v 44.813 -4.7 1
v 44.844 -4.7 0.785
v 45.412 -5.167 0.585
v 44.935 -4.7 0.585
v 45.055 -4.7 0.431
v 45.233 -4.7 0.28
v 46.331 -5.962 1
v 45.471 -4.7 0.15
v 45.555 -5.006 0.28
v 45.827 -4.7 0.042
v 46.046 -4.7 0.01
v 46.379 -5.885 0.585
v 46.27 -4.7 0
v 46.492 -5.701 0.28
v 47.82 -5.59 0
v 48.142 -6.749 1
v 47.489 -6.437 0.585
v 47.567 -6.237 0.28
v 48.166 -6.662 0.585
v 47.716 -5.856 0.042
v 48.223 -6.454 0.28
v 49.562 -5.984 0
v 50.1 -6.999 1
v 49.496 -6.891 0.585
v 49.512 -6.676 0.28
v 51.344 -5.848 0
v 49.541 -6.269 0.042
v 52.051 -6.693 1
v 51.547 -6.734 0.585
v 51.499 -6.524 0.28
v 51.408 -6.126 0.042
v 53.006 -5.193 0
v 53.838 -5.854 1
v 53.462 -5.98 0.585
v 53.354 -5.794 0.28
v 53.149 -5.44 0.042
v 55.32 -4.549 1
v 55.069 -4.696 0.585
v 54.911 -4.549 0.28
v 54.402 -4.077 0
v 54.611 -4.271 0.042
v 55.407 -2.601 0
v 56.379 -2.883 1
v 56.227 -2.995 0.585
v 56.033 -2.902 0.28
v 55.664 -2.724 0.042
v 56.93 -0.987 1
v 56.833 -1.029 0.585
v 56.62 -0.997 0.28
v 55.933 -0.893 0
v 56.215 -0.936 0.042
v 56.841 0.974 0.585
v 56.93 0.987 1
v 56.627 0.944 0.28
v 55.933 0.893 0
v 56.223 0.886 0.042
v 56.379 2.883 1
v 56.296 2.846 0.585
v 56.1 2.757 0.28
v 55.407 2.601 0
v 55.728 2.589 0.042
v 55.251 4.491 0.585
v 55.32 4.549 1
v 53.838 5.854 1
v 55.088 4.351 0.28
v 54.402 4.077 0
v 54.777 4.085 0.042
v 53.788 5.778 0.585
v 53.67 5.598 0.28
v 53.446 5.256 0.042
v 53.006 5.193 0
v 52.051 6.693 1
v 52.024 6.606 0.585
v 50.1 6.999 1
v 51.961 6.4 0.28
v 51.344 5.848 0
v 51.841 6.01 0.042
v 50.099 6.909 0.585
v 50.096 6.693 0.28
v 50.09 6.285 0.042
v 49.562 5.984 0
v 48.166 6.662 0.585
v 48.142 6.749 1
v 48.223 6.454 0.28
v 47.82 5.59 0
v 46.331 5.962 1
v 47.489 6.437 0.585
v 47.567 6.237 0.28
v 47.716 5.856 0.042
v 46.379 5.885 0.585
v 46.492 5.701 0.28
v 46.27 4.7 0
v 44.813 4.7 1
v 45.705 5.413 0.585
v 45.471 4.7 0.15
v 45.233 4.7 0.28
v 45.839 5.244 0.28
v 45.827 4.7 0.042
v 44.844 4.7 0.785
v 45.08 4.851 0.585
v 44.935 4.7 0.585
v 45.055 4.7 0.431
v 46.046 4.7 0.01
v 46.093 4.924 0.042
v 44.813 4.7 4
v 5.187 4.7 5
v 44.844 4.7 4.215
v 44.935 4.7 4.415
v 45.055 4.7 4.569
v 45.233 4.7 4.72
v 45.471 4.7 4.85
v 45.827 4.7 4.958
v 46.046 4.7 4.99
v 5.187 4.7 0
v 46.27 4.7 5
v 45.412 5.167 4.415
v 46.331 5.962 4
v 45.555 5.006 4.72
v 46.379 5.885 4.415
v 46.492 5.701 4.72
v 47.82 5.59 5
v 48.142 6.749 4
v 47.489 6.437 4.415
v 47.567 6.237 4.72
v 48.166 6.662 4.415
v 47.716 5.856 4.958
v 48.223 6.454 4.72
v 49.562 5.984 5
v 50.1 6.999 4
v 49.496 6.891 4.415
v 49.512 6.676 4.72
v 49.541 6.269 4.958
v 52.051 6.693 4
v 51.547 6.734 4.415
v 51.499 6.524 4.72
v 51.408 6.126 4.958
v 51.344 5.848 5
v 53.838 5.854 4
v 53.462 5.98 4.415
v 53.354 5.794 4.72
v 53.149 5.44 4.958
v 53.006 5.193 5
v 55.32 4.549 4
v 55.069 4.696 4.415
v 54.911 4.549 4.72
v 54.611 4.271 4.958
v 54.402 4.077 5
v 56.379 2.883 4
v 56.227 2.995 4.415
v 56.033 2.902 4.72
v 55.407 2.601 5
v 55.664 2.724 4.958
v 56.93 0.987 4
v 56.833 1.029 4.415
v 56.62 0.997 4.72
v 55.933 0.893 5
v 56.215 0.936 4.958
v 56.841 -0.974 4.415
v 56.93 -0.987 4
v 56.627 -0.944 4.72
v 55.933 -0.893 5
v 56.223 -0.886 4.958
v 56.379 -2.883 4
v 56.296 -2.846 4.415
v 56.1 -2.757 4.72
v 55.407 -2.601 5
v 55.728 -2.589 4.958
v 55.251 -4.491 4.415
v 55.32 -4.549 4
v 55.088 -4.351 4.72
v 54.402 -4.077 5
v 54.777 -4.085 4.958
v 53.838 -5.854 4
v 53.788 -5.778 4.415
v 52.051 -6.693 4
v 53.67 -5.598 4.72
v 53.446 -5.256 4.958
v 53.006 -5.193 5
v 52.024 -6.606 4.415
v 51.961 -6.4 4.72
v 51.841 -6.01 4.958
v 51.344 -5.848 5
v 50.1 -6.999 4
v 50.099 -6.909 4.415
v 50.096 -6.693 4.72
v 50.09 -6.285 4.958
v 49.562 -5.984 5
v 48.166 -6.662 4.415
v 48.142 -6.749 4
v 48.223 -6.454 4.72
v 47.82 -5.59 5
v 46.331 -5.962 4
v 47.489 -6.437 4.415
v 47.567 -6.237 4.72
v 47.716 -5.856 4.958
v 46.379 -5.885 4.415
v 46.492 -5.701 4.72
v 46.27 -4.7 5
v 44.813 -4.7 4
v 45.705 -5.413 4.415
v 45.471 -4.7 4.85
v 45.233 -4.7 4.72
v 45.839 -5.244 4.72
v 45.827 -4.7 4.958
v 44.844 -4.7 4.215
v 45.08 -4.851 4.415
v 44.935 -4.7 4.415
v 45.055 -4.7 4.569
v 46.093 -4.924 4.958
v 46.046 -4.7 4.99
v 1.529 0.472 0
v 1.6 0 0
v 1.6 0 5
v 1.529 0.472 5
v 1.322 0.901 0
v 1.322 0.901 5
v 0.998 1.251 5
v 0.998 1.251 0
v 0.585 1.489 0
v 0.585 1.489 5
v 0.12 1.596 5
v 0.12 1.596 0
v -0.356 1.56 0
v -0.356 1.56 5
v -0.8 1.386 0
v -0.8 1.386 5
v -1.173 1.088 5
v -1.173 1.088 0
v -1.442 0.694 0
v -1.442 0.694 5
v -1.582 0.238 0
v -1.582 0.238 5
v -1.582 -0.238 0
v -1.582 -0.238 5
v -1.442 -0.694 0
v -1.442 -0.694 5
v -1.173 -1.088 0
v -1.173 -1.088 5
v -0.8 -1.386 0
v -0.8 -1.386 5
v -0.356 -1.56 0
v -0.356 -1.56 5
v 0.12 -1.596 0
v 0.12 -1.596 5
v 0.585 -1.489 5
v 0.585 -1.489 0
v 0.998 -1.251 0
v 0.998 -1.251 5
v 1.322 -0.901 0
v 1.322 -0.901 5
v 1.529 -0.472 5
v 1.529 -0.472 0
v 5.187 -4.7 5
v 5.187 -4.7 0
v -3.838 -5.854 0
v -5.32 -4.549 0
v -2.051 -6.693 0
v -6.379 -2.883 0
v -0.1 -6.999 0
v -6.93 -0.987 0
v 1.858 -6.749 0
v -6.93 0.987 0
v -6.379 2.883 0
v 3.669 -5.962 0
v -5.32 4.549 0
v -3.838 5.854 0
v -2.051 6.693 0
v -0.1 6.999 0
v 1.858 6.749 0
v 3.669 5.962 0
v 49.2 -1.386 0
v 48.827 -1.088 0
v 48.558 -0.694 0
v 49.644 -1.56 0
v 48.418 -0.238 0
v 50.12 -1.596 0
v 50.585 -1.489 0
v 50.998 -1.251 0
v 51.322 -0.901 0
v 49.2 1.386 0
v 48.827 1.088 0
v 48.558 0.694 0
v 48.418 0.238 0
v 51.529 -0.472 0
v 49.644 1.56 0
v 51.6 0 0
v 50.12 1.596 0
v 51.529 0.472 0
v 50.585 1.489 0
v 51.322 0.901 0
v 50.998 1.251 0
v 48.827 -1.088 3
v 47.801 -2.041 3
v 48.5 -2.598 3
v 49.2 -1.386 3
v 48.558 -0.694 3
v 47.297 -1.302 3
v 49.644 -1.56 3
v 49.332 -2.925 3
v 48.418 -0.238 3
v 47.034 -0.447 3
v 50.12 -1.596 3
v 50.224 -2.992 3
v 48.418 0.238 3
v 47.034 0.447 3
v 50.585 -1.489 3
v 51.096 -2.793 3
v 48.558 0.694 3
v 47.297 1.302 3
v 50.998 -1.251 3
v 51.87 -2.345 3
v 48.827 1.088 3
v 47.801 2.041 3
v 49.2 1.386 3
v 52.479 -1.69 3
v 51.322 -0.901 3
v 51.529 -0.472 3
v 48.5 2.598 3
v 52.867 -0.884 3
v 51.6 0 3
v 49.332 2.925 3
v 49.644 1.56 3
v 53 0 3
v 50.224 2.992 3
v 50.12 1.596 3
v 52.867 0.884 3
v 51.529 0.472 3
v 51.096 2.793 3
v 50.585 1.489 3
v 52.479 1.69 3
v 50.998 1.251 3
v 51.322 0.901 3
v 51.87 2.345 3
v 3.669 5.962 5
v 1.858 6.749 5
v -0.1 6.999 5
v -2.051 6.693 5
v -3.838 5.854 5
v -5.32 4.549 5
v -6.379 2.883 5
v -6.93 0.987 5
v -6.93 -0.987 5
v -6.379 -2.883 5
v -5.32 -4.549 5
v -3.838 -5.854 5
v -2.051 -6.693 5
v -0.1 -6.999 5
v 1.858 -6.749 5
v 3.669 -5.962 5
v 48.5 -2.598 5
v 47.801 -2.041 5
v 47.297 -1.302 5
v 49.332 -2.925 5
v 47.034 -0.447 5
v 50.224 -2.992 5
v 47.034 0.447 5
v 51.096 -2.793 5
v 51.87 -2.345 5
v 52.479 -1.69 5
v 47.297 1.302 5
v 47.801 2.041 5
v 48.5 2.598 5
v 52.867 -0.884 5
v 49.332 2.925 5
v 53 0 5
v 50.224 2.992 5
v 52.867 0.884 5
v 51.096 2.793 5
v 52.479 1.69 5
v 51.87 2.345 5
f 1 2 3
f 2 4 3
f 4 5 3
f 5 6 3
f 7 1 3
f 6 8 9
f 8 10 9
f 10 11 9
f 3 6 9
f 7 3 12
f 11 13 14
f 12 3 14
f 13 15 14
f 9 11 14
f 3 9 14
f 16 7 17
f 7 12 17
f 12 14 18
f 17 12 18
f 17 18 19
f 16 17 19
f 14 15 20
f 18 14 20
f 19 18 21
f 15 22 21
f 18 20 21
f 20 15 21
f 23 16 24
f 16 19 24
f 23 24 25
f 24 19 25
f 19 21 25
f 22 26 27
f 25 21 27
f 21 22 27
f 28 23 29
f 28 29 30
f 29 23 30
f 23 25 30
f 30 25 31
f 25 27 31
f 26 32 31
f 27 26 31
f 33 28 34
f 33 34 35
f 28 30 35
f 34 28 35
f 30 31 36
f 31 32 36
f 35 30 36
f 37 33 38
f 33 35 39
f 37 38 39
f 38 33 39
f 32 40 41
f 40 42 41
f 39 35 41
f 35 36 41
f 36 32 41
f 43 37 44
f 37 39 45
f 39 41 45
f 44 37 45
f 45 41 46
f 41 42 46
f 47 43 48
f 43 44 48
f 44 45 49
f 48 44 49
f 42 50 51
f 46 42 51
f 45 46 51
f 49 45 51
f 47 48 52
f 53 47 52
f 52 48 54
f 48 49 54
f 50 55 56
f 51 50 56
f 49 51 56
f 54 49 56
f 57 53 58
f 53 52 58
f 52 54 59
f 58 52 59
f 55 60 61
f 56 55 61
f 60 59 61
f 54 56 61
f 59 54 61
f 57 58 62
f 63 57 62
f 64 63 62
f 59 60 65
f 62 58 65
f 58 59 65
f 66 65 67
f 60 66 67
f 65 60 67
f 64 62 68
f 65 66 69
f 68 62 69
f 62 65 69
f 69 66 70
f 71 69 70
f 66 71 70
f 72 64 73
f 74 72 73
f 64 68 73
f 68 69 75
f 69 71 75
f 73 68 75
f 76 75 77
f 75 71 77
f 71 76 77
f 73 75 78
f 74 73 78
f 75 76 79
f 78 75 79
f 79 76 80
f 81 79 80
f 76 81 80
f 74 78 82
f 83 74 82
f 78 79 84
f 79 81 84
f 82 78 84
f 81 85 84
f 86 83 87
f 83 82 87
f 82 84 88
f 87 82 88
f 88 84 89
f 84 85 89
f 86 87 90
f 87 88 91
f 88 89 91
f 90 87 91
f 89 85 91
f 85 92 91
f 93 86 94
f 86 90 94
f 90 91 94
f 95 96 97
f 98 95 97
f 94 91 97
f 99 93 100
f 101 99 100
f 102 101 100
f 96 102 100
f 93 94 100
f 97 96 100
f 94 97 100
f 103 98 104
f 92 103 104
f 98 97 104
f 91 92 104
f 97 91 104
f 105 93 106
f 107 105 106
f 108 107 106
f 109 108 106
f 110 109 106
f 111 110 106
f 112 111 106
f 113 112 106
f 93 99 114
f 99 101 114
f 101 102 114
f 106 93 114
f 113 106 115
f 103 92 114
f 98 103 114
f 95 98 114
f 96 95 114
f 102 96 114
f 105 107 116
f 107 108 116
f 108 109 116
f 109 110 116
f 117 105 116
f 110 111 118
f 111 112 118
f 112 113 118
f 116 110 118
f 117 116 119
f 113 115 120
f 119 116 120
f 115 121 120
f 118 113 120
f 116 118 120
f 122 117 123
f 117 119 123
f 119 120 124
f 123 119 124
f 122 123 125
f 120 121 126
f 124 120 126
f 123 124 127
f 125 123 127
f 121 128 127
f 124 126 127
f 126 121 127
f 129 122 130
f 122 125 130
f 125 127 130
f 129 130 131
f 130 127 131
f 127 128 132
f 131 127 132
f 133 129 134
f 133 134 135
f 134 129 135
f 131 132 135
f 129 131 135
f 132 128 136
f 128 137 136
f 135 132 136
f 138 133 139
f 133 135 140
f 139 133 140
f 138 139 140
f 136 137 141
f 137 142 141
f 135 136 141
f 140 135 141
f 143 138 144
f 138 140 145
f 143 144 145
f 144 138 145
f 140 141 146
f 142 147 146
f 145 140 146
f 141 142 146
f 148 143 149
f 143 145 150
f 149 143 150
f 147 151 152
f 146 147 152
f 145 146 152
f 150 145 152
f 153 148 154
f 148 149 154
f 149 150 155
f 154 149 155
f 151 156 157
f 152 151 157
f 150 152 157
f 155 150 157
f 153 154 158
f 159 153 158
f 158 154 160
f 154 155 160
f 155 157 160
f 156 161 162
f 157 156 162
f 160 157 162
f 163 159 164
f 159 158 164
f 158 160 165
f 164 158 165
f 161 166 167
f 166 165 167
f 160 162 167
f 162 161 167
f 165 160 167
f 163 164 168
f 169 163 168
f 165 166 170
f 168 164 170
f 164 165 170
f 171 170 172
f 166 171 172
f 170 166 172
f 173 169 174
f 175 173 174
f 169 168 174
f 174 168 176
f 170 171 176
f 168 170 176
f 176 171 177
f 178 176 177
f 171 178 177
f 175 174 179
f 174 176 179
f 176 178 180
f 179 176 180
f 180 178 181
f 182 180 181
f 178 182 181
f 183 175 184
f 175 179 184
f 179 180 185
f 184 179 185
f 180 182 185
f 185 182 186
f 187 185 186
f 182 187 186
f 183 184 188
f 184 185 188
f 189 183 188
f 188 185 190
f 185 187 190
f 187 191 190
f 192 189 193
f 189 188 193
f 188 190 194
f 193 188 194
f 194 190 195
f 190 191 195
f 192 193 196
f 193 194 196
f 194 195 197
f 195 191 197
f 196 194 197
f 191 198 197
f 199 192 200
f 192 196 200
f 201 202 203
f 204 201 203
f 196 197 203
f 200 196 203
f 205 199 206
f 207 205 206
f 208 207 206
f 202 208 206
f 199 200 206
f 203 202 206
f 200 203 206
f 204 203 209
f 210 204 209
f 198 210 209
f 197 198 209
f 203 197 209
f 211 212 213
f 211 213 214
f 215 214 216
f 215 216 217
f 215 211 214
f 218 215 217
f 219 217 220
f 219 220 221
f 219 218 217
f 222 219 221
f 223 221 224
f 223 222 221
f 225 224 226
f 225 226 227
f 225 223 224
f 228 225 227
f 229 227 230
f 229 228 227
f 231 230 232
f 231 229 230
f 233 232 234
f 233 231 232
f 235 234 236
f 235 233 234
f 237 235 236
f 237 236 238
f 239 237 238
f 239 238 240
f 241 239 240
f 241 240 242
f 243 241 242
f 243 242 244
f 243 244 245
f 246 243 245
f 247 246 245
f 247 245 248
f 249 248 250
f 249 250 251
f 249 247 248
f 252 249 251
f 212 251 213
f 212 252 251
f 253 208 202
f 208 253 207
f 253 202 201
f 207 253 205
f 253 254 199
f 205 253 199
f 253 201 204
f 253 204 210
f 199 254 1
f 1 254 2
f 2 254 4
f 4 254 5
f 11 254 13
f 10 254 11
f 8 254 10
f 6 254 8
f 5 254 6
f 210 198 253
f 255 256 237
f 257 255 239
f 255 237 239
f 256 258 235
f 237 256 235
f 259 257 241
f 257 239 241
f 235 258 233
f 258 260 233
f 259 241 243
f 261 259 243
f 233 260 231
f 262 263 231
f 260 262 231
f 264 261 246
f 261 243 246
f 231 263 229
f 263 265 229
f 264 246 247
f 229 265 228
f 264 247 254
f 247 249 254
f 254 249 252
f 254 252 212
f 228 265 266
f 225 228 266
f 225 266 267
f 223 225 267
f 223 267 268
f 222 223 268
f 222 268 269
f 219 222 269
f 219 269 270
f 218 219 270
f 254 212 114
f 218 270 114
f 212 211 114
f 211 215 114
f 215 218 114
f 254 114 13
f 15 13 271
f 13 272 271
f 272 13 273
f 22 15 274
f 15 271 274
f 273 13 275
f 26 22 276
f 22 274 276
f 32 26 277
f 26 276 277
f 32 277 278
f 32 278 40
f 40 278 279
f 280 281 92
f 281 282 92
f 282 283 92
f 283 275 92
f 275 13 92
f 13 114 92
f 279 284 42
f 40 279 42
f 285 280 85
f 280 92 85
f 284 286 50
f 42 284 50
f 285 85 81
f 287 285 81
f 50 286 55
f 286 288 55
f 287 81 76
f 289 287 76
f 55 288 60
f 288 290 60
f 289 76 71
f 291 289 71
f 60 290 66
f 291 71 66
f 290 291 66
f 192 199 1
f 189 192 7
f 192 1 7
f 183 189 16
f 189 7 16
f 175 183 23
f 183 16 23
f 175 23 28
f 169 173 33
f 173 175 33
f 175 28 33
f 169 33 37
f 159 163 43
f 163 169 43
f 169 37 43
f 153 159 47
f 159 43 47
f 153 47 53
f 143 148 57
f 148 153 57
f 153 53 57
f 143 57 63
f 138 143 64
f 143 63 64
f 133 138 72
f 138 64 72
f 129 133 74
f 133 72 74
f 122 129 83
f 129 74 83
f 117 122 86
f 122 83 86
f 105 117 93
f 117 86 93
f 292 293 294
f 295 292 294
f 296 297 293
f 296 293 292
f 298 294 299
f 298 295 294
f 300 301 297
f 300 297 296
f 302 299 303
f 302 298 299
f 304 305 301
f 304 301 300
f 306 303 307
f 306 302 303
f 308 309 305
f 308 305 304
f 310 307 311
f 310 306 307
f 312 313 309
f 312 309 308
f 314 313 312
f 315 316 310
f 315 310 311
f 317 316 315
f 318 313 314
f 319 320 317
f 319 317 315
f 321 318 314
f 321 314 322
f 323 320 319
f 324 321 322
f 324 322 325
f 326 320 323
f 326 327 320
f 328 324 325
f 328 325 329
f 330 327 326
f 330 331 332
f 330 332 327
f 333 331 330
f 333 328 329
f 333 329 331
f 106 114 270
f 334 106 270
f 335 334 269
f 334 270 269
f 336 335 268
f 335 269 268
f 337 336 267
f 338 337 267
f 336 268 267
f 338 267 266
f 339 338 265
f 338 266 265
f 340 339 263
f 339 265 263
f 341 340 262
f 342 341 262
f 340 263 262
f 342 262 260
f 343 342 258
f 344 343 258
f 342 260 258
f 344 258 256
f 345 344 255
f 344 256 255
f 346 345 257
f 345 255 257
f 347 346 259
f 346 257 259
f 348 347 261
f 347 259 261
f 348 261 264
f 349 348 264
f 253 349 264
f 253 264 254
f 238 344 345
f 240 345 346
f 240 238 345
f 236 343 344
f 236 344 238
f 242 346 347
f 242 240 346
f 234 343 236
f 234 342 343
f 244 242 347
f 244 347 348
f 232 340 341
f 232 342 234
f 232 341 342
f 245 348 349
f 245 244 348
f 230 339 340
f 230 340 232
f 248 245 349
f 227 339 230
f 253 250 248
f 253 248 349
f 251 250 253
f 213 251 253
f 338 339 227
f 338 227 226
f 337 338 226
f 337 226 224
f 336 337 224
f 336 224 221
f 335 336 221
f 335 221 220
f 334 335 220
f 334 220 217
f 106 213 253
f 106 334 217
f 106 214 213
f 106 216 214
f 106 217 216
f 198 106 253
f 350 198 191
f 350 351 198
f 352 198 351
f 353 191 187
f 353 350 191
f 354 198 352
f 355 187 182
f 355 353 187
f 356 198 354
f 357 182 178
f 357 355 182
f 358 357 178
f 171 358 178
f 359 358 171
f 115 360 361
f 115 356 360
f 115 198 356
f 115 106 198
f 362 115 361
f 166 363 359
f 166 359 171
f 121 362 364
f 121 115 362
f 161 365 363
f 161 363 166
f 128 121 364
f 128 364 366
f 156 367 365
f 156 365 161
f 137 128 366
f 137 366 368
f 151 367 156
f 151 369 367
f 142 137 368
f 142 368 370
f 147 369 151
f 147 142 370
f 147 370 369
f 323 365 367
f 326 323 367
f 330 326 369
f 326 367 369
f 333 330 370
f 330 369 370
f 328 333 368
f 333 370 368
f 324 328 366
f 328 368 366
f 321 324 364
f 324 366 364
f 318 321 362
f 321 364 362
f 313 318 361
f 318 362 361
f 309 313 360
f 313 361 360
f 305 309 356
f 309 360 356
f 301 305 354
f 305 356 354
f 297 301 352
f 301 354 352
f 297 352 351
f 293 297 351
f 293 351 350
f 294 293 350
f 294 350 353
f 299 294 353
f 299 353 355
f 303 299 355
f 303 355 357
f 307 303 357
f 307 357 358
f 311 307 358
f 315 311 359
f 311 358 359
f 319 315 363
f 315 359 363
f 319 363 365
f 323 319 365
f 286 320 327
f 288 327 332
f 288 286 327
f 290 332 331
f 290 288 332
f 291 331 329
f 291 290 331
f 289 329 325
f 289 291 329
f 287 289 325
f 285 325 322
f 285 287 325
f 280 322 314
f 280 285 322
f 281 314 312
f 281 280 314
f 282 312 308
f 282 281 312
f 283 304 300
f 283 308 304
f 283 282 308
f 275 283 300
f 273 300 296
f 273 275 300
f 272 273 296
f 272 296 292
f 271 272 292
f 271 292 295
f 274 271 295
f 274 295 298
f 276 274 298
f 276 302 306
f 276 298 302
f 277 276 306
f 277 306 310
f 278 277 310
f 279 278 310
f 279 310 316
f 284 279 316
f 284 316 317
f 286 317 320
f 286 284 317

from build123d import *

# Parameters (mm, degrees)
SKETCH1_R           = 1.6
BOSS_EXTRUDE1_DEPTH = 5
SKETCH2_R           = 3
CUT_EXTRUDE1_DEPTH  = 2
BOSS_EXTRUDE2_START = -5
SKETCH3_R           = 7
SKETCH3_R_2         = 4.7
BOSS_EXTRUDE2_DEPTH = 5
FILLET1_R           = 1


with BuildPart() as part:
    # Sketch1 → Boss-Extrude1 (new body)
    with BuildSketch(Plane.XY):
        with BuildLine():
            ThreePointArc((0, 4.7), (-4.7, 0), (0, -4.7))
            Line((0, -4.7), (50, -4.7))
            ThreePointArc((50, -4.7), (54.7, 0), (50, 4.7))
            Line((50, 4.7), (0, 4.7))
        make_face()
        Circle(SKETCH1_R, mode=Mode.SUBTRACT)
        with Locations((50, 0)):
            Circle(SKETCH1_R, mode=Mode.SUBTRACT)
    extrude(amount=BOSS_EXTRUDE1_DEPTH)

    # Sketch2 → Cut-Extrude1 (cut)
    with BuildSketch(Plane.XY.offset(5)):
        with Locations((50, 0)):
            Circle(SKETCH2_R)
    extrude(amount=-CUT_EXTRUDE1_DEPTH, mode=Mode.SUBTRACT)

    # Sketch3 → Boss-Extrude2 (add)
    # profile 1 of 2: a face of its own
    with BuildSketch(Plane.XY.offset(5).offset(BOSS_EXTRUDE2_START)):
        with Locations((50, 0)):
            Circle(SKETCH3_R)
        with Locations((50, 0)):
            Circle(SKETCH3_R_2, mode=Mode.SUBTRACT)
    # profile 2 of 2: a face of its own
    with BuildSketch(Plane.XY.offset(5).offset(BOSS_EXTRUDE2_START)):
        Circle(SKETCH3_R)
        Circle(SKETCH3_R_2, mode=Mode.SUBTRACT)
    extrude(amount=BOSS_EXTRUDE2_DEPTH)

    # Fillet1
    fillet1_edges = [part.edges().sort_by_distance(p)[0] for p in [
        (57, 0, 5),
        (57, 0, 0),
    ]]
    fillet(fillet1_edges, radius=FILLET1_R)


solid = part.part
